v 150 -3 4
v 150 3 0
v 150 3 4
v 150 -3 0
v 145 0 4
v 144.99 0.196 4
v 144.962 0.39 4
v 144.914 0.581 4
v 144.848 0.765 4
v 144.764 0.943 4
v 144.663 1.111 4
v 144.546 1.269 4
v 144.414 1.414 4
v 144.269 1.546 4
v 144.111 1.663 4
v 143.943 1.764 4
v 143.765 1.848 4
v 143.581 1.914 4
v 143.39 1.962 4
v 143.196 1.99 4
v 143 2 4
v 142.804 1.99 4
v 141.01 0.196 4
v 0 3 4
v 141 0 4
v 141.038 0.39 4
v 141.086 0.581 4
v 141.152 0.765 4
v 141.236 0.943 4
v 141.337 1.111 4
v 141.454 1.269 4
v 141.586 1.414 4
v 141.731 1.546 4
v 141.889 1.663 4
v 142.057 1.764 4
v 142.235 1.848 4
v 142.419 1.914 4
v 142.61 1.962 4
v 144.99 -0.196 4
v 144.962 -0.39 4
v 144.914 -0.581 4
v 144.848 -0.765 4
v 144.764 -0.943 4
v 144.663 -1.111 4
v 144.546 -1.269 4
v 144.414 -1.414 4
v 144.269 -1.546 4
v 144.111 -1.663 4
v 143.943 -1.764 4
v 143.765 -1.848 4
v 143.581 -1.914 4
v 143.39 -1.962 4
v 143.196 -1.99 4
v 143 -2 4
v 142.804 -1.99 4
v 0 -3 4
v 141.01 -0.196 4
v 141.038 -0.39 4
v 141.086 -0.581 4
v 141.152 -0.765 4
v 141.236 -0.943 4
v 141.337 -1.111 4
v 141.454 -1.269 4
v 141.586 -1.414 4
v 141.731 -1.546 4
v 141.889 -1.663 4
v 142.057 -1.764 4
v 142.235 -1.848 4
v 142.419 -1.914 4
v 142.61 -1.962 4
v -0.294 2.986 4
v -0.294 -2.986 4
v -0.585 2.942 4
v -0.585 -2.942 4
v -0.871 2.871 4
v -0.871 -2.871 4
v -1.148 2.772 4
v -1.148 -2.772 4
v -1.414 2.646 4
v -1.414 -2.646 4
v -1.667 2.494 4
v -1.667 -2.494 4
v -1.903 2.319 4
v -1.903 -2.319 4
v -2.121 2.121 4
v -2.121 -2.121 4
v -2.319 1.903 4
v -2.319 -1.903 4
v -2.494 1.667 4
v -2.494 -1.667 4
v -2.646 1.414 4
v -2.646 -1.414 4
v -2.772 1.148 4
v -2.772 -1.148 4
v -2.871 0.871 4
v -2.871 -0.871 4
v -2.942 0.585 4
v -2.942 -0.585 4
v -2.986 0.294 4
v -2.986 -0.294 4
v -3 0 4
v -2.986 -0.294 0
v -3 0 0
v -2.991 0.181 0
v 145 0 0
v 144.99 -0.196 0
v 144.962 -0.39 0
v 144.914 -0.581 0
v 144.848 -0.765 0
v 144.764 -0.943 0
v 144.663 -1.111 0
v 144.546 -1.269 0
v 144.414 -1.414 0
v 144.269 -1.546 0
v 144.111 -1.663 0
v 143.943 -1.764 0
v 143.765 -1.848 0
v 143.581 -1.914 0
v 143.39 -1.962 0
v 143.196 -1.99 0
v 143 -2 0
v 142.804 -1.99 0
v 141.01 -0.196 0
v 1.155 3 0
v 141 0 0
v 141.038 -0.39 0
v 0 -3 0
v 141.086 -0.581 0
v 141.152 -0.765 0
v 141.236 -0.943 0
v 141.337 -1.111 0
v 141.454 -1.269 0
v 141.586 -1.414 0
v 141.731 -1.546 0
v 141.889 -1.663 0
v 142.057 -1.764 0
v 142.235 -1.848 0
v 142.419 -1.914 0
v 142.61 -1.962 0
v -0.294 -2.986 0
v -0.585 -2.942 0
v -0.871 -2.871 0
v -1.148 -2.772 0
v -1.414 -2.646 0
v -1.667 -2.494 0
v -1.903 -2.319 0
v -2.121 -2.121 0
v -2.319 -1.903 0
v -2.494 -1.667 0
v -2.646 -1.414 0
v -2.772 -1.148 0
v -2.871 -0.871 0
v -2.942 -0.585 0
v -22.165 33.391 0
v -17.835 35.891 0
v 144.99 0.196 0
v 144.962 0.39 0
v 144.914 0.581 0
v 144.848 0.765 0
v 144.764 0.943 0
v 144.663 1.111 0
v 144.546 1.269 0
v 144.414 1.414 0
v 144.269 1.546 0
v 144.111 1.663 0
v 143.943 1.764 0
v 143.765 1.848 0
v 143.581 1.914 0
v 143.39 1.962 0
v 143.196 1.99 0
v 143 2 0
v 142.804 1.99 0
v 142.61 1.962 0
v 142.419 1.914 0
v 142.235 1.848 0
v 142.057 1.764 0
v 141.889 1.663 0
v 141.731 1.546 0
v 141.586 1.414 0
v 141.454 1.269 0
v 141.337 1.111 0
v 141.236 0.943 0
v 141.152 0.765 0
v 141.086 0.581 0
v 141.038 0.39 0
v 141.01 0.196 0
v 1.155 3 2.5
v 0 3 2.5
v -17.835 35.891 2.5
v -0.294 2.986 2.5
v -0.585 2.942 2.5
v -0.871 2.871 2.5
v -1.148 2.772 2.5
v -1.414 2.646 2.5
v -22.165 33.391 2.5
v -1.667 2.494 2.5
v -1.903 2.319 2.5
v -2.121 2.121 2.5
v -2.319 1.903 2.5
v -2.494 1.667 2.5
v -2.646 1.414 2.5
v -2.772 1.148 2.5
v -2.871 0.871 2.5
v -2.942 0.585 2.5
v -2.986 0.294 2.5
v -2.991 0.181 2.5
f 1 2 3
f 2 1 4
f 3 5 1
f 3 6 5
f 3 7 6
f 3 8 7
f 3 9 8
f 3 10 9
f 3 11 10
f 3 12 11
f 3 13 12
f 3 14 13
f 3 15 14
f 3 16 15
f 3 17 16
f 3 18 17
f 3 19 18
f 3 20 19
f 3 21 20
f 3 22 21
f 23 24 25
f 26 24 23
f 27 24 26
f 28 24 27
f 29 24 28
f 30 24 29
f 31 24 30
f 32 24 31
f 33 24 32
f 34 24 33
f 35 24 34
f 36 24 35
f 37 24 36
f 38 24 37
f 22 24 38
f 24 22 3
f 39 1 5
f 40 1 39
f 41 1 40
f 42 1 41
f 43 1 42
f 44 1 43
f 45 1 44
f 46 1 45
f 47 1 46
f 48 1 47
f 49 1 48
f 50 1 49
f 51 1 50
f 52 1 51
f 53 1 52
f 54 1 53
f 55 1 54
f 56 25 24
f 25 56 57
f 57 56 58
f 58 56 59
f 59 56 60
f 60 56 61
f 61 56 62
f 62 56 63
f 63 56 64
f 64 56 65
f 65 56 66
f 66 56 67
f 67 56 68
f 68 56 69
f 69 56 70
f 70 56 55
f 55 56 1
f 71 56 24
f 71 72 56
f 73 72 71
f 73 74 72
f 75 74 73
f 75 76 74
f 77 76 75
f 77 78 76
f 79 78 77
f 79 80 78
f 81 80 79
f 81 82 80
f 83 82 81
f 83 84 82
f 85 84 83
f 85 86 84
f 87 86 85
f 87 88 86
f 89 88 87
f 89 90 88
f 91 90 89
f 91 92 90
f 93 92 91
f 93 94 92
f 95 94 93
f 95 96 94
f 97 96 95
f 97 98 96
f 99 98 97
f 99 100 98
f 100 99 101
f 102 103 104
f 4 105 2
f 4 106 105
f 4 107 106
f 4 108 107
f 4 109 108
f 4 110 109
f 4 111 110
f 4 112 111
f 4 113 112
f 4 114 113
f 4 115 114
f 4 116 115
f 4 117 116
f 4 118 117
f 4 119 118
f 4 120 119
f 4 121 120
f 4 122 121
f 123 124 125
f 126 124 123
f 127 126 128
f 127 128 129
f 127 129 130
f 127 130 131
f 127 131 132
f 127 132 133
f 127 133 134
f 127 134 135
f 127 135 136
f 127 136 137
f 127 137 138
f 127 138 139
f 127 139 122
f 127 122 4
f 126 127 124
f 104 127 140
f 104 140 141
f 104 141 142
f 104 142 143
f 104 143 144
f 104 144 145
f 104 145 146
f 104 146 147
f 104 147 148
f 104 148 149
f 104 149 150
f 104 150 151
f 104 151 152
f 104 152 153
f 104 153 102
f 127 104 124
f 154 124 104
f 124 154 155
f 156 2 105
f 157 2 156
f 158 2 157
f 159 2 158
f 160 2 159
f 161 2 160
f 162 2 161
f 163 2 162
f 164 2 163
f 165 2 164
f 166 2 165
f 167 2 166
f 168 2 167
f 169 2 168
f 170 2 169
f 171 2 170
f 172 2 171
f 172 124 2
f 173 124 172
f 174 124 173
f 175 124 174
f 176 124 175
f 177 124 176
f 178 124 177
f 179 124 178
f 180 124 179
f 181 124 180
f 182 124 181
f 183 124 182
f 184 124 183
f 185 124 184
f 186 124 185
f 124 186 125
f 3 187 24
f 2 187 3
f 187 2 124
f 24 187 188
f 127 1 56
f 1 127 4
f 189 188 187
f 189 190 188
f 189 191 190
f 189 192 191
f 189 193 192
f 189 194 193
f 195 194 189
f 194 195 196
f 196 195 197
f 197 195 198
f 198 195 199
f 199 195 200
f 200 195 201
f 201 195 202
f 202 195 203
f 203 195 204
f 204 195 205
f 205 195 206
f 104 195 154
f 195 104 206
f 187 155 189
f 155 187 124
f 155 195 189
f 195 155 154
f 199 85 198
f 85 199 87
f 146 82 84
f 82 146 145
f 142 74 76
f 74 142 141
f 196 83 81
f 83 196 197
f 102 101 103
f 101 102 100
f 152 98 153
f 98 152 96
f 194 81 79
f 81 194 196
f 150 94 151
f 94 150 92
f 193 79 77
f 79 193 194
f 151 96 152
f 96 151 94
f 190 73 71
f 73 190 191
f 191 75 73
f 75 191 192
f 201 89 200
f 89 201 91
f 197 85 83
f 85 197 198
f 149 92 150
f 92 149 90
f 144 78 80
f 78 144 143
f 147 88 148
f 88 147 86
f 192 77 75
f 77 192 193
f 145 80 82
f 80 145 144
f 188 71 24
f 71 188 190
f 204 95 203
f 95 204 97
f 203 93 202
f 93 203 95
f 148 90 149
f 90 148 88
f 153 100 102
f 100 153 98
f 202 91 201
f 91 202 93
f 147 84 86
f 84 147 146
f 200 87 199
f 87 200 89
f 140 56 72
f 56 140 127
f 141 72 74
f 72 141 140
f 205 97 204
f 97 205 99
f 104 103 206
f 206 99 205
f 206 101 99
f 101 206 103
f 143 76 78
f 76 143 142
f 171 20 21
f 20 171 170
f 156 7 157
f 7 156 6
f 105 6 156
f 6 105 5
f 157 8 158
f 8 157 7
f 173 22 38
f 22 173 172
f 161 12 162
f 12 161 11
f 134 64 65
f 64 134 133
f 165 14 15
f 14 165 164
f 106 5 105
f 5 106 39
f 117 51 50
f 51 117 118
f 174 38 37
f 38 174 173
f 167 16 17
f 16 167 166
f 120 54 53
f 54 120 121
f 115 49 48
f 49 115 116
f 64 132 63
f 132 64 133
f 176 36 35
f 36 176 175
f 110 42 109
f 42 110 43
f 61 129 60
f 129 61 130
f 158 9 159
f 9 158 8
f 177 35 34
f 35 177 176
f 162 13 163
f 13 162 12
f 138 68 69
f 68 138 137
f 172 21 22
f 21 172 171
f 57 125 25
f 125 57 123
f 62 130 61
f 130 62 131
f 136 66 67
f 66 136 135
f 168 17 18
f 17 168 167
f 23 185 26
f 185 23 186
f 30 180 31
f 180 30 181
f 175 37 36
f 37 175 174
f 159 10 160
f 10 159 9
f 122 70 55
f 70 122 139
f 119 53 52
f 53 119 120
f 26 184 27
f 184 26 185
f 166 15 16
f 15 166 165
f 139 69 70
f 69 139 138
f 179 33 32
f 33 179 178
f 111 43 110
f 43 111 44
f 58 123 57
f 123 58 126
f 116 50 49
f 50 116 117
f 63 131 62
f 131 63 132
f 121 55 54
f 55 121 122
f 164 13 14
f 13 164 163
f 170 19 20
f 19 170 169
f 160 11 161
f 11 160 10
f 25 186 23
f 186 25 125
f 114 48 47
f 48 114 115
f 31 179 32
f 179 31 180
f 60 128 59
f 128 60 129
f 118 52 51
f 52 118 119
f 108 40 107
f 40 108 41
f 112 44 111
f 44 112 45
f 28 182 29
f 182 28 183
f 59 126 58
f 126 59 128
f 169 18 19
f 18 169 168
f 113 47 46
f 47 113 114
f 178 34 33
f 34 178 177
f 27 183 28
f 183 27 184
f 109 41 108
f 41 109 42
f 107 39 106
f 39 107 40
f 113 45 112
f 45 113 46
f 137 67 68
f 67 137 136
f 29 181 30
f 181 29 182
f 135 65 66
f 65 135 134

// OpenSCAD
// L-shaped (hockey-stick) cell spreader for plating bacteria
// Dimensions measured in mm

// Handle dimensions
handle_length = 150;
handle_width = 6;
handle_thickness = 4;

// Foot dimensions
foot_length = 40;
foot_width = 5;
foot_thickness = 2.5;

// Boss dimensions
boss_diameter = 6;
boss_height = 4;

// Hanging hole
hole_diameter = 4;
hole_x = 143;

// Angle between handle (+X) and foot (120 deg CCW from +X)
foot_angle = 120;

// Resolution for curved shapes
$fn = 64;

// Main structure
difference() {
    union() {
        // Handle: lies along +X axis, centred in Y, z=0 to thickness
        // x = 0 to 150, y = -3 to 3, z = 0 to 4
        translate([0, -handle_width/2, 0])
            cube([handle_length, handle_width, handle_thickness], center = false);

        // Foot: rotated 120 degrees around Z, centred in its local Y, z=0 to foot_thickness
        // Centre line starts at origin, points 120 deg CCW from +X
        rotate([0, 0, foot_angle])
            translate([0, -foot_width/2, 0])
                cube([foot_length, foot_width, foot_thickness], center = false);

        // Boss at origin: cylinder centred at x=0, y=0, z=0 to boss_height
        translate([0, 0, 0])
            cylinder(h = boss_height, r = boss_diameter / 2, center = false);
    }

    // Hanging hole: cylinder extending past the handle thickness
    // Hole at x=143, y=0, going through z=0 to z=4
    translate([hole_x, 0, -0.5])
        cylinder(h = handle_thickness + 1, r = hole_diameter / 2, center = false);
}
